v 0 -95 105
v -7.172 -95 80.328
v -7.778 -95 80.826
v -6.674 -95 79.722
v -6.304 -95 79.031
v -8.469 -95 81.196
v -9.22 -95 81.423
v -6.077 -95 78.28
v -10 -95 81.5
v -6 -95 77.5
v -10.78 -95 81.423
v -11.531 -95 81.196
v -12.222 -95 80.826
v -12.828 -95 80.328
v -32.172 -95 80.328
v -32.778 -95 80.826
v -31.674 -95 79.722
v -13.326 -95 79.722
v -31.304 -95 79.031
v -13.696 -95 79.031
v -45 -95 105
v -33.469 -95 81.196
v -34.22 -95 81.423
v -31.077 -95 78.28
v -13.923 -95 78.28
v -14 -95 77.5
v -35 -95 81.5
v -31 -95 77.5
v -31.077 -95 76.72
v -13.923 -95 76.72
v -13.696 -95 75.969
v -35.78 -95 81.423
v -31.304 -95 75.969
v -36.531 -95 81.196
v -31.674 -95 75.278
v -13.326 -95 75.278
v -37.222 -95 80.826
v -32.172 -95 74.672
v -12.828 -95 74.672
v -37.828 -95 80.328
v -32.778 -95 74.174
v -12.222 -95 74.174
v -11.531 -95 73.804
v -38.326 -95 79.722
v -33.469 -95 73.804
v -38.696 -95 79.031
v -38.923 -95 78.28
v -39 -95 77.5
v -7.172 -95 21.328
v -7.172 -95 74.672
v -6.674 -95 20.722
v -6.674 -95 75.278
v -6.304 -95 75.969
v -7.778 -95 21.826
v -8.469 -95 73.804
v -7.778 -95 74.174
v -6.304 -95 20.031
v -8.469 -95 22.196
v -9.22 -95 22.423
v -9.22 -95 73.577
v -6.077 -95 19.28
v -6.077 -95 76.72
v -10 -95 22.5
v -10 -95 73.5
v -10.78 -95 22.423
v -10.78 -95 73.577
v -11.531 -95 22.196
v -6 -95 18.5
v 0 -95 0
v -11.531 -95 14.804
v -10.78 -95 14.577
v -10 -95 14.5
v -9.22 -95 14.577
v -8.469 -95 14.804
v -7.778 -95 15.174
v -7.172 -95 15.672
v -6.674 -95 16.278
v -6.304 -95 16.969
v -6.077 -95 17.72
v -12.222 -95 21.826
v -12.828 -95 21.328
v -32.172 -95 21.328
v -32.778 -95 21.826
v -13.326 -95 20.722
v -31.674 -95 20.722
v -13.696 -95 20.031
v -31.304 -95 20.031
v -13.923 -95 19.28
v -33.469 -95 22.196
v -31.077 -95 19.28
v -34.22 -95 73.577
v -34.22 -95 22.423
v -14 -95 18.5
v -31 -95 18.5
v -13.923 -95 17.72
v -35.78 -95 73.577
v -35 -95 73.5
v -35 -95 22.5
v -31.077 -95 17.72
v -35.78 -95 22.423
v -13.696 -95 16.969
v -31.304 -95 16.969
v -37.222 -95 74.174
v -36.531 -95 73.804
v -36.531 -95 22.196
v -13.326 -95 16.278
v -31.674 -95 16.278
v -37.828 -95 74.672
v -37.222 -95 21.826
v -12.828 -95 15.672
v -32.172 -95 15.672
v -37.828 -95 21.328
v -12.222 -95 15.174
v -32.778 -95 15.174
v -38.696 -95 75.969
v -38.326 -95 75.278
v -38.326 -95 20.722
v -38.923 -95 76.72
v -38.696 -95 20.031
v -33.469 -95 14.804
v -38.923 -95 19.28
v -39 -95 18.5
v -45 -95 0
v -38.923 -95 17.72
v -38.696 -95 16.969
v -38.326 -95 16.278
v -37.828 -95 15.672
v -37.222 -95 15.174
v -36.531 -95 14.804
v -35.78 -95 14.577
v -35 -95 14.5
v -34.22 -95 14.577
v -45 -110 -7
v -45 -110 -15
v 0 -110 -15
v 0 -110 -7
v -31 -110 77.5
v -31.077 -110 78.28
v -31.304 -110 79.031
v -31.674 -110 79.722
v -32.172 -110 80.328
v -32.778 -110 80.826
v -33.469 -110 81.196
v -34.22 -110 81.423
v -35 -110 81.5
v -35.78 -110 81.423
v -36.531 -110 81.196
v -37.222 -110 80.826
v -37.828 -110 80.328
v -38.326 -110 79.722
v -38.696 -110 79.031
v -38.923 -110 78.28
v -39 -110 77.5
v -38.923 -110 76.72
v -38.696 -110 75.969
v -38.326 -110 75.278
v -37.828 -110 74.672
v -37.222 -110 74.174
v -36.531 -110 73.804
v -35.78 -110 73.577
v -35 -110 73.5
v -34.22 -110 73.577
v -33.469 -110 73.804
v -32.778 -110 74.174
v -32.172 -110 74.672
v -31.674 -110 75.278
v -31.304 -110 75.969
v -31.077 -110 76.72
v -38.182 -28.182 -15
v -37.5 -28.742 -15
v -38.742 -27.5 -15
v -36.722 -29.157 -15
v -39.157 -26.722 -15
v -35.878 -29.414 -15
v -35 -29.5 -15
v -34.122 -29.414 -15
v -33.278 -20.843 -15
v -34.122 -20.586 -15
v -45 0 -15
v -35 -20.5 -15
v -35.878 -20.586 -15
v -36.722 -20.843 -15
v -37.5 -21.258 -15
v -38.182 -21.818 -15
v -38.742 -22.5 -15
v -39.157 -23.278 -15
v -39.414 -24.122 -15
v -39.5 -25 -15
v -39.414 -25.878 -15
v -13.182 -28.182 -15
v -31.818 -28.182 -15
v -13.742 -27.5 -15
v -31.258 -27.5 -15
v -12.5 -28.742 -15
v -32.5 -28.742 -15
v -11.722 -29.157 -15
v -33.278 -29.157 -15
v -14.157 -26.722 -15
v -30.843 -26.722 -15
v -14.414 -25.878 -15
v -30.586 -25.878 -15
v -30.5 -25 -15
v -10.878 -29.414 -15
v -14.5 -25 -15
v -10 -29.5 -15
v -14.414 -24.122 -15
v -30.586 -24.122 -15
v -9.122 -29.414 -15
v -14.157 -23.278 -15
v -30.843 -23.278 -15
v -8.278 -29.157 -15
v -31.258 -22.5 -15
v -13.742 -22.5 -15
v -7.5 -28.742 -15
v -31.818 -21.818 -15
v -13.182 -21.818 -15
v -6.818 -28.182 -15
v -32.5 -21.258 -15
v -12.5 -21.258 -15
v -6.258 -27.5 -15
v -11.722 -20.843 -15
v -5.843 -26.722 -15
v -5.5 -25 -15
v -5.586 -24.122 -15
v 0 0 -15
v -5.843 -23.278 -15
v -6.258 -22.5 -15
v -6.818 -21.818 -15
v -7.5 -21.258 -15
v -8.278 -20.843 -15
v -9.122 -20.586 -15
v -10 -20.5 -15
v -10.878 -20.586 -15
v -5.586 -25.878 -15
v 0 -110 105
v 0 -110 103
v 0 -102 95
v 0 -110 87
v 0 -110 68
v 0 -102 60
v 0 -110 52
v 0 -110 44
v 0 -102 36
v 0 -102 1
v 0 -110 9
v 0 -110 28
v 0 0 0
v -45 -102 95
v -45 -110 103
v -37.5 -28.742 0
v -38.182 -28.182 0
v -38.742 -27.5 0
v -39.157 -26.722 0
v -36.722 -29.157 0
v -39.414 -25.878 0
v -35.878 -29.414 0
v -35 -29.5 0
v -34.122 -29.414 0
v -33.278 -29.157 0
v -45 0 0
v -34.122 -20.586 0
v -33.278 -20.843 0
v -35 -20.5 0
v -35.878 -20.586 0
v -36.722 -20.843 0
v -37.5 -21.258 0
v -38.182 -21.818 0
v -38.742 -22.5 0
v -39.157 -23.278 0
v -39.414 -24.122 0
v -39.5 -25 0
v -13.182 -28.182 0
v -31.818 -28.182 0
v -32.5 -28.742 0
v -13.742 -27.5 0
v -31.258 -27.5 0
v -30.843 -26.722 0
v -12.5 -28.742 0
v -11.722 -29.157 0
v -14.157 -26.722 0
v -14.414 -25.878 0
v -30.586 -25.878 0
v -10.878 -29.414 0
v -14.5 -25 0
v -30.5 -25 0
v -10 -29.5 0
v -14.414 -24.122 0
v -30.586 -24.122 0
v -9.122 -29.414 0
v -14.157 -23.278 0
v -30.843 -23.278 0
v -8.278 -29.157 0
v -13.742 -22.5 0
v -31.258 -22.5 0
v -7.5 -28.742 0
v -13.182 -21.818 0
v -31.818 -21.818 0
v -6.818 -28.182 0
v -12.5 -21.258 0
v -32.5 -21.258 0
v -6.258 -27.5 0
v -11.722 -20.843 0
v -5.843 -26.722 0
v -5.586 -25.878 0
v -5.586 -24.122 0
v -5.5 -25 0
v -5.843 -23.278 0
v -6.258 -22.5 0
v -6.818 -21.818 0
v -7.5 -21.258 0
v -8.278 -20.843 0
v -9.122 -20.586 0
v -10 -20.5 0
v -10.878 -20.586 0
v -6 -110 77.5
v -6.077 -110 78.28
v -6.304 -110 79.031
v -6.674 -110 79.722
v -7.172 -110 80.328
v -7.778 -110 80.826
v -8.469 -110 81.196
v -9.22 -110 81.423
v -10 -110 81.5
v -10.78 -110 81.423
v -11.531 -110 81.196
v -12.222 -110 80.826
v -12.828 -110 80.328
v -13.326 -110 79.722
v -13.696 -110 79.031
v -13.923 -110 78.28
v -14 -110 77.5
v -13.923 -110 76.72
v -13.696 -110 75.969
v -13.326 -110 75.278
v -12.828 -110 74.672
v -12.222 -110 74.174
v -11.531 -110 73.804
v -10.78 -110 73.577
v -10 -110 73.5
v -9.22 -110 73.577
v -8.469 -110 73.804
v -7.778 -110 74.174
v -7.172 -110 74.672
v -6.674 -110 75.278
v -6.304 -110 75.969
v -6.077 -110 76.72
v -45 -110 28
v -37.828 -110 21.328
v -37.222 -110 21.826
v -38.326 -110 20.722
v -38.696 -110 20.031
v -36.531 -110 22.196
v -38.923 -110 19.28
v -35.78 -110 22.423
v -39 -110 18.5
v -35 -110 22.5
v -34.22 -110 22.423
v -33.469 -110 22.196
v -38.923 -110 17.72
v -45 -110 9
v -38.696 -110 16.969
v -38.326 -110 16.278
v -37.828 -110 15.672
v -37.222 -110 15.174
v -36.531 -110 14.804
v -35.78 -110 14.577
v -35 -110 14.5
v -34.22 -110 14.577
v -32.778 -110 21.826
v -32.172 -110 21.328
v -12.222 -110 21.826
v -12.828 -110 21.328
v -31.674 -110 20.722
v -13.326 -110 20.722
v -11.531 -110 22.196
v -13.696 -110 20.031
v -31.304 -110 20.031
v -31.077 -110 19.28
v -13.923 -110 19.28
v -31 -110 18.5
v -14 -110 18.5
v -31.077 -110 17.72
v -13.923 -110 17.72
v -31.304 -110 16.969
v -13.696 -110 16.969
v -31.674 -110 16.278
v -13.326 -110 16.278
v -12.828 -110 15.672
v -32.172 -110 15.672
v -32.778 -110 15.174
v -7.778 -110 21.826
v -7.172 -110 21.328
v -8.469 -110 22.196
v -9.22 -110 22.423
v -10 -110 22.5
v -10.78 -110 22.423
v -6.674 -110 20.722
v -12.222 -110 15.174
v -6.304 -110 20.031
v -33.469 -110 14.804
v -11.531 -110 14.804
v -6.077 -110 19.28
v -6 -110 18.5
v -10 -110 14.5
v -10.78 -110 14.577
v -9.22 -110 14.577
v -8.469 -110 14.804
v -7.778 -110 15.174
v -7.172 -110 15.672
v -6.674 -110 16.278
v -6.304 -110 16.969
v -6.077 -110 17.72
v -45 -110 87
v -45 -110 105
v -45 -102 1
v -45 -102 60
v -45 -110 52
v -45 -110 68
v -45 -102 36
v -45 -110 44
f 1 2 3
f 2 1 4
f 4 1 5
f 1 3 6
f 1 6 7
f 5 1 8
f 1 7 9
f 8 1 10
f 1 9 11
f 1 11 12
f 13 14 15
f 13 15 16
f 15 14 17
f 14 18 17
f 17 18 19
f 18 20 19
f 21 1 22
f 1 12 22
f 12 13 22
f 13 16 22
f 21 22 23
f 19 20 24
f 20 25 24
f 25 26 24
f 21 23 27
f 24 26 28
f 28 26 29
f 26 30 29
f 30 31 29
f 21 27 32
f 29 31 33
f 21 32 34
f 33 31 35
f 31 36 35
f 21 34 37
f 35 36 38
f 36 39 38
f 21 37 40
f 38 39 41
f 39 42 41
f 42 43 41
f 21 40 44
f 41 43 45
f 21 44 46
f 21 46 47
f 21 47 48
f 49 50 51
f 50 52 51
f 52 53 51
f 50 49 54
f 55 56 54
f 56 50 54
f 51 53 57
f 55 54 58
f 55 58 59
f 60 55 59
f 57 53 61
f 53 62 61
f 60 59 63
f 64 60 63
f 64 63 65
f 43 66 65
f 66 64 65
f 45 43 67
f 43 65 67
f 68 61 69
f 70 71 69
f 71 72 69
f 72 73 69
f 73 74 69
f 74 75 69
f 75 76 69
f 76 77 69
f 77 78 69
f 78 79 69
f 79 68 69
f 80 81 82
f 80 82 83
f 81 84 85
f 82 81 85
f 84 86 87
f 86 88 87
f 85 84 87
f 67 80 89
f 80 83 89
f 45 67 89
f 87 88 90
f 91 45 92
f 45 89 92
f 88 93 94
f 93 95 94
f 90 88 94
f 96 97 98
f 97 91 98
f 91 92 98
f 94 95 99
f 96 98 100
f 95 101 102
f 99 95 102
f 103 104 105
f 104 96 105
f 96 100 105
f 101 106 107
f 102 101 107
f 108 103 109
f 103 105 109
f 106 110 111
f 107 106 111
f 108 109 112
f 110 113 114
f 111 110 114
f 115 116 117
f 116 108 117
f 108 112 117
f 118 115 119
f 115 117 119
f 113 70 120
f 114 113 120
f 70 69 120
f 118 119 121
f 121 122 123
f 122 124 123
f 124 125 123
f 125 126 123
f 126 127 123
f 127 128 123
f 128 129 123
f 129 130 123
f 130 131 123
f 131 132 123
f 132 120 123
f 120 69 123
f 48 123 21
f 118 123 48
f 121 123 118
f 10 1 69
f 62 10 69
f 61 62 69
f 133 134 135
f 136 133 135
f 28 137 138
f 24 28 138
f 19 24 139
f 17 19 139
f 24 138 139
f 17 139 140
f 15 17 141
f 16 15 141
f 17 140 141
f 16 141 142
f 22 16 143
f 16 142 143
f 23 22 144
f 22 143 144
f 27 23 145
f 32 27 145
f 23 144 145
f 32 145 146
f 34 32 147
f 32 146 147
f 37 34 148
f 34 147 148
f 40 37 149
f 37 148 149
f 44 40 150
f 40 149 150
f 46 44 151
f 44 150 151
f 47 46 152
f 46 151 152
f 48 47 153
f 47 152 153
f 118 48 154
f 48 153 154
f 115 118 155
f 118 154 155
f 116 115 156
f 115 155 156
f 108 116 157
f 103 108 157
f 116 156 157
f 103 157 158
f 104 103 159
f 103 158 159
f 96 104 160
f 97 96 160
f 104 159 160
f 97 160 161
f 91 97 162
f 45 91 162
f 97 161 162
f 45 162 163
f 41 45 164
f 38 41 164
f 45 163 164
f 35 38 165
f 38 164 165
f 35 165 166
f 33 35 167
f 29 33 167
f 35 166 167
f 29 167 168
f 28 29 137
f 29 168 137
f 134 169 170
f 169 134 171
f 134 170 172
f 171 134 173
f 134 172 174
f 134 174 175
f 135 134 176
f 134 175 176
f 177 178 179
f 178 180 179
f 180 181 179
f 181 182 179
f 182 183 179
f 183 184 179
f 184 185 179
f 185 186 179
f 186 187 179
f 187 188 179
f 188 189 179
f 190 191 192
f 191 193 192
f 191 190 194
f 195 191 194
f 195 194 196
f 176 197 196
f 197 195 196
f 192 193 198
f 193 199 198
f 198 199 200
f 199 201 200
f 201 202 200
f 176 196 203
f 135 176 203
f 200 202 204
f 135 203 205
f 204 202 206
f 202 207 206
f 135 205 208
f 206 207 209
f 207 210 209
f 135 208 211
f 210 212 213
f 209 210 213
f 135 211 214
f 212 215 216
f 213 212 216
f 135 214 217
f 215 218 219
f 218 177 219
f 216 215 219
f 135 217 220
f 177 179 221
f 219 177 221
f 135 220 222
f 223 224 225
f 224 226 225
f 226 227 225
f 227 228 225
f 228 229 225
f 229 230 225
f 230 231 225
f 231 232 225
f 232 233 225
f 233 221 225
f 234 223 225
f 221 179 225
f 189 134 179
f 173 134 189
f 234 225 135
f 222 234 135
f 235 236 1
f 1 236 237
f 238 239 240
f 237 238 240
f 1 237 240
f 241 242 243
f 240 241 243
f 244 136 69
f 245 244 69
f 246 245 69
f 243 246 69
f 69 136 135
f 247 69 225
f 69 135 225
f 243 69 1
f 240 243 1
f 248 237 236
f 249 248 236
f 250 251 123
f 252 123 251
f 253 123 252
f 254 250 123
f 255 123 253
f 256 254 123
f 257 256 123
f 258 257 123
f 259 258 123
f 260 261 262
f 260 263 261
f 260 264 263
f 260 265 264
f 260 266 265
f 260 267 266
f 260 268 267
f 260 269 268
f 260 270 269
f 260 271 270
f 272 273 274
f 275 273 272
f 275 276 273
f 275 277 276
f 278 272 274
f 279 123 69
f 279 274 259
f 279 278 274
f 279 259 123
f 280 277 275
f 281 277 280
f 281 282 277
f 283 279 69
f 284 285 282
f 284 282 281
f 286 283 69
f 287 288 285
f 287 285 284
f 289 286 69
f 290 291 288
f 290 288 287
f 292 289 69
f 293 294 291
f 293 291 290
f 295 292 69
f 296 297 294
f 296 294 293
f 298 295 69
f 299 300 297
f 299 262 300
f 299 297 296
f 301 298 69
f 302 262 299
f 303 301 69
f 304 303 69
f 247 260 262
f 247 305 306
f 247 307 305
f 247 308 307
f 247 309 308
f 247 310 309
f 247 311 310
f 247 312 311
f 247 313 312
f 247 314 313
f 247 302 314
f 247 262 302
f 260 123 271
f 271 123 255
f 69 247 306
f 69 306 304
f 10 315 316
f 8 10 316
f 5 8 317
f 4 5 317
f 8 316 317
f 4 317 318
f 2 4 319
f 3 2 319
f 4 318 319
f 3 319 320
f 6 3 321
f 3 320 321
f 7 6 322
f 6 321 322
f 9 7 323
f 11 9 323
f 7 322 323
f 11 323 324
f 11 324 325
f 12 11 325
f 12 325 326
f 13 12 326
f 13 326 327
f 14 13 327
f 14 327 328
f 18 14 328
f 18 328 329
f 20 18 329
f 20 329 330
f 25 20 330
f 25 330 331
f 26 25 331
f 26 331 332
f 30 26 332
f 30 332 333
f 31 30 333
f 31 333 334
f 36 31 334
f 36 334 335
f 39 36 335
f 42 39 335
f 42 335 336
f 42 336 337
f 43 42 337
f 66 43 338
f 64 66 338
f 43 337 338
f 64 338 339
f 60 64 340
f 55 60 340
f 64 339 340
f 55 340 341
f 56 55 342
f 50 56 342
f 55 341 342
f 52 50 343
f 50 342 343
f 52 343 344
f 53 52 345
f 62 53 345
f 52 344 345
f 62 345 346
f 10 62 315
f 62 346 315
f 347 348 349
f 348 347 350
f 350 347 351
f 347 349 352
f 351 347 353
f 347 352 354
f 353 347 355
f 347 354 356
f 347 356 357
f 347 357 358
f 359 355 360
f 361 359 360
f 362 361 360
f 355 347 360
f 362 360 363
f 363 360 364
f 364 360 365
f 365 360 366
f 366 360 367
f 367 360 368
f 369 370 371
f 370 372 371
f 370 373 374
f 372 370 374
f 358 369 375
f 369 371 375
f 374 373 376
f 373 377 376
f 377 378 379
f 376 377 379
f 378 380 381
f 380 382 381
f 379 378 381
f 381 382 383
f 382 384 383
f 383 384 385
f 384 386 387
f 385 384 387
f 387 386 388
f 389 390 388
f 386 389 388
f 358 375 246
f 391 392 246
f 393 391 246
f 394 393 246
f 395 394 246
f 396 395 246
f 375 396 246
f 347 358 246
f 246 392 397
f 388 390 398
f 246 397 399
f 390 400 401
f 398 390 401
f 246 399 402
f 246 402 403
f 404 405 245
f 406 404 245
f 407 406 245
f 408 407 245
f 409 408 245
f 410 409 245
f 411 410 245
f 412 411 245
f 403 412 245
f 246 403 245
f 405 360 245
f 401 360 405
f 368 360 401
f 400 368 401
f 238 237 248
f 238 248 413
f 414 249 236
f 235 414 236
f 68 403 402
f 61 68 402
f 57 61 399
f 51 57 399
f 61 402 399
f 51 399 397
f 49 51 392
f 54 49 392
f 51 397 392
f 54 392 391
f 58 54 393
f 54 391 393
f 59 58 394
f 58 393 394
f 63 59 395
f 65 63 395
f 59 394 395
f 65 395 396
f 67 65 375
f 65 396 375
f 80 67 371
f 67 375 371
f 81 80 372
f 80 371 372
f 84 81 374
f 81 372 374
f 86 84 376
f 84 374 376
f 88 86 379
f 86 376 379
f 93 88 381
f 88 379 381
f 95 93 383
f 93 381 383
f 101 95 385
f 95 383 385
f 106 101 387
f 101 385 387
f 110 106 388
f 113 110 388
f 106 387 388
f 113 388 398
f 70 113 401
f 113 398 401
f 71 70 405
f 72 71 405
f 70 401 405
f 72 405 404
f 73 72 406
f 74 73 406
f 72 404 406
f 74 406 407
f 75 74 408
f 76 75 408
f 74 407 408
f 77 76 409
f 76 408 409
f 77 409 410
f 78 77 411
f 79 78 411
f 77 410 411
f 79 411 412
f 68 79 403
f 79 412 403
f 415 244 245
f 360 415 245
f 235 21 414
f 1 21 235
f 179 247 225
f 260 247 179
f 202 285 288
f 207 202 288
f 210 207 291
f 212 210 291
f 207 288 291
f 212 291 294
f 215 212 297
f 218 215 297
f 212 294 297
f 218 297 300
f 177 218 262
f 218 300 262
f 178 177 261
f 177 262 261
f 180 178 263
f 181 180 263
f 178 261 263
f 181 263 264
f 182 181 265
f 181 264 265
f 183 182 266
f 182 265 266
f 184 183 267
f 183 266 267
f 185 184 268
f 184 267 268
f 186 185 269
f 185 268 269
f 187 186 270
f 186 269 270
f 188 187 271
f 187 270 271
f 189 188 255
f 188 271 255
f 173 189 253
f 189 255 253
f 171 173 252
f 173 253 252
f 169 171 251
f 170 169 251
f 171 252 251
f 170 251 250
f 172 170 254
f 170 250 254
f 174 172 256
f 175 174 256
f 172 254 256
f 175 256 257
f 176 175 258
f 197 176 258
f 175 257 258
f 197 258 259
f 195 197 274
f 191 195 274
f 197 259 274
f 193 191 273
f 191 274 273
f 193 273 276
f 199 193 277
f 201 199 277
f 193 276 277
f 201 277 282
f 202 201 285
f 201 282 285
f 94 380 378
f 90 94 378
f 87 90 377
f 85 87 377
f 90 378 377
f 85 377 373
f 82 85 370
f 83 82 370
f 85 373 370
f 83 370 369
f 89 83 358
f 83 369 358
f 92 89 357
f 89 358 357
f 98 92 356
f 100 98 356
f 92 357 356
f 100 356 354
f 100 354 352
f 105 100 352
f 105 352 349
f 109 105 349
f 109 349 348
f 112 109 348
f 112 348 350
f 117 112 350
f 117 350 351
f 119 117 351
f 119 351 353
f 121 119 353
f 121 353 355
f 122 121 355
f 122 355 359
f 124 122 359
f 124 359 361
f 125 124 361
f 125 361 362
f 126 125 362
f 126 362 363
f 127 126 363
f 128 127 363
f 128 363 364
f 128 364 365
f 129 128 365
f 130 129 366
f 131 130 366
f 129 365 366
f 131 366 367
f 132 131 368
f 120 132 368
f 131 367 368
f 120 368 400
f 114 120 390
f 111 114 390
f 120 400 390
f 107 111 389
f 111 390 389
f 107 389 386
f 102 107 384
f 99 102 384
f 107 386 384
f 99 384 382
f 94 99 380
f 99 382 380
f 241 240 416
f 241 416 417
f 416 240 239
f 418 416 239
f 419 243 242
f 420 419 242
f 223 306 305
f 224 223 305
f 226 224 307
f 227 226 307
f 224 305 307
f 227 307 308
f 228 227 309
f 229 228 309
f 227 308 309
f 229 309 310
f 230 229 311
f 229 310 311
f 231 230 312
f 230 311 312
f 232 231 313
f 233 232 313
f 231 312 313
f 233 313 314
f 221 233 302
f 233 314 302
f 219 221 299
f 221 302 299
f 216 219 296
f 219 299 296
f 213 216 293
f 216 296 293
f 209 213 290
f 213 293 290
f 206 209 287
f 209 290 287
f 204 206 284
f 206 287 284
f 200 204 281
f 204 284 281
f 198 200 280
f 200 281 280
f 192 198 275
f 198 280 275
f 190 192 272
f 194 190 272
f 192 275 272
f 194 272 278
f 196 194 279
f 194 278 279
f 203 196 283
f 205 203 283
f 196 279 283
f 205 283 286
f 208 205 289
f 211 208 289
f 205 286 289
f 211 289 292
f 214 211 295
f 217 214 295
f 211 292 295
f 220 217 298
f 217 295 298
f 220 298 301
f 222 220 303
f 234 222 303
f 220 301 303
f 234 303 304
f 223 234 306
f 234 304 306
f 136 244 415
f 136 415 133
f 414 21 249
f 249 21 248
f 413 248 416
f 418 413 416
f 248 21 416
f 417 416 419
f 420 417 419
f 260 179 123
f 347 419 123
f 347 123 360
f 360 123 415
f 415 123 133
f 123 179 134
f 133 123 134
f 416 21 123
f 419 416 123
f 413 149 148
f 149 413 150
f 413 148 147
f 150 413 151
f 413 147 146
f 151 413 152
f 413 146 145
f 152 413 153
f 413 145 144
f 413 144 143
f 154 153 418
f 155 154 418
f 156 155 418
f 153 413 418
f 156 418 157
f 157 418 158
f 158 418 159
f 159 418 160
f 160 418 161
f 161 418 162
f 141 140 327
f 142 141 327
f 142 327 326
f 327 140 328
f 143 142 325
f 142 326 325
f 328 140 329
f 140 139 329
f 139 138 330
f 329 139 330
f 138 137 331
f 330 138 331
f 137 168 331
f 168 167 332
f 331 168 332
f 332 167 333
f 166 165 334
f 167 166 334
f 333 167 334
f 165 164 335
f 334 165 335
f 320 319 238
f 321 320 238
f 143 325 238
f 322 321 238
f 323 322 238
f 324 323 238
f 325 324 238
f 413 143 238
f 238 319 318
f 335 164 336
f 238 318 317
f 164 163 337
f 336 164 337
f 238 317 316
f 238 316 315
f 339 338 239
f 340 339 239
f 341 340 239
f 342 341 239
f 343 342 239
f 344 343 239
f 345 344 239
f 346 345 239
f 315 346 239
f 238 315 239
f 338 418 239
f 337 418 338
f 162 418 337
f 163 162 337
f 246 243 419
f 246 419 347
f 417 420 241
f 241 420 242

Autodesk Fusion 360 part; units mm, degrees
sketch "スケッチ1" plane through (0, 0, 0) normal (0, 0, 1) x (1, 0, 0)
  line L0 (0, 0) -> (-45, 0)
  line L1 (-45, 0) -> (-45, -110)
  line L2 (-45, -110) -> (0, -110)
  line L3 (0, -110) -> (0, 0)
  circle A0 centre (-35, -25) radius 4.5
  circle A1 centre (-10, -25) radius 4.5
  dimension "d1" = 45
  dimension "d2" = 110
  dimension "d3" = 9
  dimension "d4" = 9
  dimension "d5" = 25
  dimension "d6" = 10
  dimension "d7" = 25
extrude "押し出し1" add sketch "スケッチ1" against normal blind 15 contours L0 L1 L2 L3 | A0 | A1
extrude "押し出し2" cut sketch "スケッチ1" against normal blind 15 contours A0 | A1
sketch "スケッチ2" plane through (0, 0, 0) normal (0, 0, 1) x (1, 0, 0)
  line L0 (0, -95) -> (-45, -95)
  line L1 (-45, -95) -> (-45, -110)
  line L2 (-45, -110) -> (0, -110)
  line L3 (0, -110) -> (0, -95)
  line L4 (0, -110) -> (0, 0)
  point P0 (-45, -110)
  dimension "d12" = 15
extrude "押し出し3" add sketch "スケッチ2" along normal blind 105
sketch "スケッチ3" plane through (0, 0, 0) normal (1, 0, 0) x (0, 1, 0)
  line L0 (-110, 105) -> (-110, -15)
  line L1 (-110, -15) -> (0, -15)
  line L2 (0, -15) -> (0, 0)
  line L3 (0, 0) -> (-95, 0)
  line L4 (-95, 0) -> (-95, 105)
  line L5 (-95, 105) -> (-110, 105)
  line L6 (-110, 95) -> (-102, 95)
  line L7 (-102, 95) -> (-110, 103)
  line L8 (-102, 95) -> (-110, 87)
  circle A0 centre (-117.5091, 95.717) radius 11
  line L9 (-146.8307, 84.717) -> (-108.4644, 84.717)
  line L10 (-108.4644, 84.717) -> (-108.4644, 71.717)
  line L11 (-108.4644, 71.717) -> (-146.8307, 71.717)
  line L12 (-146.8307, 71.717) -> (-146.8307, 84.717)
  circle A1 centre (-117.5091, 60.717) radius 11
  line L13 (-110, 60) -> (-102, 60)
  line L14 (-102, 60) -> (-110, 68)
  line L15 (-102, 60) -> (-110, 52)
  circle A2 centre (-117.5091, 60.717) radius 13
  circle A3 centre (-117.5091, 36.717) radius 11
  line L16 (-102, 36) -> (-110, 28)
  line L17 (-102, 36) -> (-110, 44)
  line L18 (-102, 1) -> (-110, 9)
  line L19 (-102, 1) -> (-110, -7)
  circle A4 centre (-117.5091, 1.717) radius 13
  circle A5 centre (-113.2021, 95.093) radius 7.5
  circle A6 centre (-113.2568, 60.0071) radius 7.5
  dimension "d15" = 8
  dimension "d16" = 45
  dimension "d17" = 22
  dimension "d18" = 13
  dimension "d19" = 38.3662
  dimension "d20" = 22
  dimension "d21" = 8
  dimension "d22" = 45
  dimension "d23" = 35
  dimension "d24" = 26
  dimension "d27" = 0
  dimension "d28" = -59
  dimension "d29" = 2
  dimension "d32" = 15
  dimension "d33" = 15
extrude "押し出し4" cut sketch "スケッチ3" against normal blind 50 contours L0 L18 L19 A4 | L18 L19 A4 | L0 A3 L16 L17 | L0 A3 L17 | L0 A1 L13 L15 A2 A6 | L13 L15 A2 | L0 A1 A6 | L13 L14 A2 | A1 L13 L14 A2 A6 | L0 A1 L14 A6 | L0 A1 L13 A6 | A1 L13 A6 | A1 L13 A6 | L0 A1 L13 A6 | L0 L6 L8 A0 A5 | L0 A0 A5 | L0 L7 A0 A5 | L6 L7 A0 A5 | L0 L6 A0 A5 | L6 A0 A5 | L0 L6 A0 A5 | L6 A0 A5 picked at (-109.6585, 34.1515) picked at (-109.8639, 53.0034) picked at (-109.8537, 88.034)
sketch "スケッチ4" plane through (0, -110, 0) normal (0, -1, 0) x (1, 0, 0)
  line L0 (-45, 68) -> (0, 68)
  line L1 (0, 68) -> (0, 87)
  line L2 (0, 87) -> (-45, 87)
  line L3 (-45, 87) -> (-45, 68)
  circle A0 centre (-35, 77.5) radius 4
  circle A1 centre (-10, 77.5) radius 4
  line L4 (-22.5, 77.5) -> (-22.5, 71.9777)
  line L5 (-45, 105) -> (0, 105)
  circle A2 centre (-35, 18.5) radius 4
  circle A3 centre (-10, 18.5) radius 4
  dimension "d34" = 8
  dimension "d35" = 8
  dimension "d36" = 25
  dimension "d37" = 12.5
  dimension "d38" = 45
  dimension "d39" = 27.5
  dimension "d42" = 0
  dimension "d43" = -59
extrude "押し出し5" cut sketch "スケッチ4" against normal blind 15 contours A0 | A1 | A2 | A3
equation "d13 = 120 mm - 15 mm"
equation "d37 = ( 25 / 2 ) * 1 mm"
